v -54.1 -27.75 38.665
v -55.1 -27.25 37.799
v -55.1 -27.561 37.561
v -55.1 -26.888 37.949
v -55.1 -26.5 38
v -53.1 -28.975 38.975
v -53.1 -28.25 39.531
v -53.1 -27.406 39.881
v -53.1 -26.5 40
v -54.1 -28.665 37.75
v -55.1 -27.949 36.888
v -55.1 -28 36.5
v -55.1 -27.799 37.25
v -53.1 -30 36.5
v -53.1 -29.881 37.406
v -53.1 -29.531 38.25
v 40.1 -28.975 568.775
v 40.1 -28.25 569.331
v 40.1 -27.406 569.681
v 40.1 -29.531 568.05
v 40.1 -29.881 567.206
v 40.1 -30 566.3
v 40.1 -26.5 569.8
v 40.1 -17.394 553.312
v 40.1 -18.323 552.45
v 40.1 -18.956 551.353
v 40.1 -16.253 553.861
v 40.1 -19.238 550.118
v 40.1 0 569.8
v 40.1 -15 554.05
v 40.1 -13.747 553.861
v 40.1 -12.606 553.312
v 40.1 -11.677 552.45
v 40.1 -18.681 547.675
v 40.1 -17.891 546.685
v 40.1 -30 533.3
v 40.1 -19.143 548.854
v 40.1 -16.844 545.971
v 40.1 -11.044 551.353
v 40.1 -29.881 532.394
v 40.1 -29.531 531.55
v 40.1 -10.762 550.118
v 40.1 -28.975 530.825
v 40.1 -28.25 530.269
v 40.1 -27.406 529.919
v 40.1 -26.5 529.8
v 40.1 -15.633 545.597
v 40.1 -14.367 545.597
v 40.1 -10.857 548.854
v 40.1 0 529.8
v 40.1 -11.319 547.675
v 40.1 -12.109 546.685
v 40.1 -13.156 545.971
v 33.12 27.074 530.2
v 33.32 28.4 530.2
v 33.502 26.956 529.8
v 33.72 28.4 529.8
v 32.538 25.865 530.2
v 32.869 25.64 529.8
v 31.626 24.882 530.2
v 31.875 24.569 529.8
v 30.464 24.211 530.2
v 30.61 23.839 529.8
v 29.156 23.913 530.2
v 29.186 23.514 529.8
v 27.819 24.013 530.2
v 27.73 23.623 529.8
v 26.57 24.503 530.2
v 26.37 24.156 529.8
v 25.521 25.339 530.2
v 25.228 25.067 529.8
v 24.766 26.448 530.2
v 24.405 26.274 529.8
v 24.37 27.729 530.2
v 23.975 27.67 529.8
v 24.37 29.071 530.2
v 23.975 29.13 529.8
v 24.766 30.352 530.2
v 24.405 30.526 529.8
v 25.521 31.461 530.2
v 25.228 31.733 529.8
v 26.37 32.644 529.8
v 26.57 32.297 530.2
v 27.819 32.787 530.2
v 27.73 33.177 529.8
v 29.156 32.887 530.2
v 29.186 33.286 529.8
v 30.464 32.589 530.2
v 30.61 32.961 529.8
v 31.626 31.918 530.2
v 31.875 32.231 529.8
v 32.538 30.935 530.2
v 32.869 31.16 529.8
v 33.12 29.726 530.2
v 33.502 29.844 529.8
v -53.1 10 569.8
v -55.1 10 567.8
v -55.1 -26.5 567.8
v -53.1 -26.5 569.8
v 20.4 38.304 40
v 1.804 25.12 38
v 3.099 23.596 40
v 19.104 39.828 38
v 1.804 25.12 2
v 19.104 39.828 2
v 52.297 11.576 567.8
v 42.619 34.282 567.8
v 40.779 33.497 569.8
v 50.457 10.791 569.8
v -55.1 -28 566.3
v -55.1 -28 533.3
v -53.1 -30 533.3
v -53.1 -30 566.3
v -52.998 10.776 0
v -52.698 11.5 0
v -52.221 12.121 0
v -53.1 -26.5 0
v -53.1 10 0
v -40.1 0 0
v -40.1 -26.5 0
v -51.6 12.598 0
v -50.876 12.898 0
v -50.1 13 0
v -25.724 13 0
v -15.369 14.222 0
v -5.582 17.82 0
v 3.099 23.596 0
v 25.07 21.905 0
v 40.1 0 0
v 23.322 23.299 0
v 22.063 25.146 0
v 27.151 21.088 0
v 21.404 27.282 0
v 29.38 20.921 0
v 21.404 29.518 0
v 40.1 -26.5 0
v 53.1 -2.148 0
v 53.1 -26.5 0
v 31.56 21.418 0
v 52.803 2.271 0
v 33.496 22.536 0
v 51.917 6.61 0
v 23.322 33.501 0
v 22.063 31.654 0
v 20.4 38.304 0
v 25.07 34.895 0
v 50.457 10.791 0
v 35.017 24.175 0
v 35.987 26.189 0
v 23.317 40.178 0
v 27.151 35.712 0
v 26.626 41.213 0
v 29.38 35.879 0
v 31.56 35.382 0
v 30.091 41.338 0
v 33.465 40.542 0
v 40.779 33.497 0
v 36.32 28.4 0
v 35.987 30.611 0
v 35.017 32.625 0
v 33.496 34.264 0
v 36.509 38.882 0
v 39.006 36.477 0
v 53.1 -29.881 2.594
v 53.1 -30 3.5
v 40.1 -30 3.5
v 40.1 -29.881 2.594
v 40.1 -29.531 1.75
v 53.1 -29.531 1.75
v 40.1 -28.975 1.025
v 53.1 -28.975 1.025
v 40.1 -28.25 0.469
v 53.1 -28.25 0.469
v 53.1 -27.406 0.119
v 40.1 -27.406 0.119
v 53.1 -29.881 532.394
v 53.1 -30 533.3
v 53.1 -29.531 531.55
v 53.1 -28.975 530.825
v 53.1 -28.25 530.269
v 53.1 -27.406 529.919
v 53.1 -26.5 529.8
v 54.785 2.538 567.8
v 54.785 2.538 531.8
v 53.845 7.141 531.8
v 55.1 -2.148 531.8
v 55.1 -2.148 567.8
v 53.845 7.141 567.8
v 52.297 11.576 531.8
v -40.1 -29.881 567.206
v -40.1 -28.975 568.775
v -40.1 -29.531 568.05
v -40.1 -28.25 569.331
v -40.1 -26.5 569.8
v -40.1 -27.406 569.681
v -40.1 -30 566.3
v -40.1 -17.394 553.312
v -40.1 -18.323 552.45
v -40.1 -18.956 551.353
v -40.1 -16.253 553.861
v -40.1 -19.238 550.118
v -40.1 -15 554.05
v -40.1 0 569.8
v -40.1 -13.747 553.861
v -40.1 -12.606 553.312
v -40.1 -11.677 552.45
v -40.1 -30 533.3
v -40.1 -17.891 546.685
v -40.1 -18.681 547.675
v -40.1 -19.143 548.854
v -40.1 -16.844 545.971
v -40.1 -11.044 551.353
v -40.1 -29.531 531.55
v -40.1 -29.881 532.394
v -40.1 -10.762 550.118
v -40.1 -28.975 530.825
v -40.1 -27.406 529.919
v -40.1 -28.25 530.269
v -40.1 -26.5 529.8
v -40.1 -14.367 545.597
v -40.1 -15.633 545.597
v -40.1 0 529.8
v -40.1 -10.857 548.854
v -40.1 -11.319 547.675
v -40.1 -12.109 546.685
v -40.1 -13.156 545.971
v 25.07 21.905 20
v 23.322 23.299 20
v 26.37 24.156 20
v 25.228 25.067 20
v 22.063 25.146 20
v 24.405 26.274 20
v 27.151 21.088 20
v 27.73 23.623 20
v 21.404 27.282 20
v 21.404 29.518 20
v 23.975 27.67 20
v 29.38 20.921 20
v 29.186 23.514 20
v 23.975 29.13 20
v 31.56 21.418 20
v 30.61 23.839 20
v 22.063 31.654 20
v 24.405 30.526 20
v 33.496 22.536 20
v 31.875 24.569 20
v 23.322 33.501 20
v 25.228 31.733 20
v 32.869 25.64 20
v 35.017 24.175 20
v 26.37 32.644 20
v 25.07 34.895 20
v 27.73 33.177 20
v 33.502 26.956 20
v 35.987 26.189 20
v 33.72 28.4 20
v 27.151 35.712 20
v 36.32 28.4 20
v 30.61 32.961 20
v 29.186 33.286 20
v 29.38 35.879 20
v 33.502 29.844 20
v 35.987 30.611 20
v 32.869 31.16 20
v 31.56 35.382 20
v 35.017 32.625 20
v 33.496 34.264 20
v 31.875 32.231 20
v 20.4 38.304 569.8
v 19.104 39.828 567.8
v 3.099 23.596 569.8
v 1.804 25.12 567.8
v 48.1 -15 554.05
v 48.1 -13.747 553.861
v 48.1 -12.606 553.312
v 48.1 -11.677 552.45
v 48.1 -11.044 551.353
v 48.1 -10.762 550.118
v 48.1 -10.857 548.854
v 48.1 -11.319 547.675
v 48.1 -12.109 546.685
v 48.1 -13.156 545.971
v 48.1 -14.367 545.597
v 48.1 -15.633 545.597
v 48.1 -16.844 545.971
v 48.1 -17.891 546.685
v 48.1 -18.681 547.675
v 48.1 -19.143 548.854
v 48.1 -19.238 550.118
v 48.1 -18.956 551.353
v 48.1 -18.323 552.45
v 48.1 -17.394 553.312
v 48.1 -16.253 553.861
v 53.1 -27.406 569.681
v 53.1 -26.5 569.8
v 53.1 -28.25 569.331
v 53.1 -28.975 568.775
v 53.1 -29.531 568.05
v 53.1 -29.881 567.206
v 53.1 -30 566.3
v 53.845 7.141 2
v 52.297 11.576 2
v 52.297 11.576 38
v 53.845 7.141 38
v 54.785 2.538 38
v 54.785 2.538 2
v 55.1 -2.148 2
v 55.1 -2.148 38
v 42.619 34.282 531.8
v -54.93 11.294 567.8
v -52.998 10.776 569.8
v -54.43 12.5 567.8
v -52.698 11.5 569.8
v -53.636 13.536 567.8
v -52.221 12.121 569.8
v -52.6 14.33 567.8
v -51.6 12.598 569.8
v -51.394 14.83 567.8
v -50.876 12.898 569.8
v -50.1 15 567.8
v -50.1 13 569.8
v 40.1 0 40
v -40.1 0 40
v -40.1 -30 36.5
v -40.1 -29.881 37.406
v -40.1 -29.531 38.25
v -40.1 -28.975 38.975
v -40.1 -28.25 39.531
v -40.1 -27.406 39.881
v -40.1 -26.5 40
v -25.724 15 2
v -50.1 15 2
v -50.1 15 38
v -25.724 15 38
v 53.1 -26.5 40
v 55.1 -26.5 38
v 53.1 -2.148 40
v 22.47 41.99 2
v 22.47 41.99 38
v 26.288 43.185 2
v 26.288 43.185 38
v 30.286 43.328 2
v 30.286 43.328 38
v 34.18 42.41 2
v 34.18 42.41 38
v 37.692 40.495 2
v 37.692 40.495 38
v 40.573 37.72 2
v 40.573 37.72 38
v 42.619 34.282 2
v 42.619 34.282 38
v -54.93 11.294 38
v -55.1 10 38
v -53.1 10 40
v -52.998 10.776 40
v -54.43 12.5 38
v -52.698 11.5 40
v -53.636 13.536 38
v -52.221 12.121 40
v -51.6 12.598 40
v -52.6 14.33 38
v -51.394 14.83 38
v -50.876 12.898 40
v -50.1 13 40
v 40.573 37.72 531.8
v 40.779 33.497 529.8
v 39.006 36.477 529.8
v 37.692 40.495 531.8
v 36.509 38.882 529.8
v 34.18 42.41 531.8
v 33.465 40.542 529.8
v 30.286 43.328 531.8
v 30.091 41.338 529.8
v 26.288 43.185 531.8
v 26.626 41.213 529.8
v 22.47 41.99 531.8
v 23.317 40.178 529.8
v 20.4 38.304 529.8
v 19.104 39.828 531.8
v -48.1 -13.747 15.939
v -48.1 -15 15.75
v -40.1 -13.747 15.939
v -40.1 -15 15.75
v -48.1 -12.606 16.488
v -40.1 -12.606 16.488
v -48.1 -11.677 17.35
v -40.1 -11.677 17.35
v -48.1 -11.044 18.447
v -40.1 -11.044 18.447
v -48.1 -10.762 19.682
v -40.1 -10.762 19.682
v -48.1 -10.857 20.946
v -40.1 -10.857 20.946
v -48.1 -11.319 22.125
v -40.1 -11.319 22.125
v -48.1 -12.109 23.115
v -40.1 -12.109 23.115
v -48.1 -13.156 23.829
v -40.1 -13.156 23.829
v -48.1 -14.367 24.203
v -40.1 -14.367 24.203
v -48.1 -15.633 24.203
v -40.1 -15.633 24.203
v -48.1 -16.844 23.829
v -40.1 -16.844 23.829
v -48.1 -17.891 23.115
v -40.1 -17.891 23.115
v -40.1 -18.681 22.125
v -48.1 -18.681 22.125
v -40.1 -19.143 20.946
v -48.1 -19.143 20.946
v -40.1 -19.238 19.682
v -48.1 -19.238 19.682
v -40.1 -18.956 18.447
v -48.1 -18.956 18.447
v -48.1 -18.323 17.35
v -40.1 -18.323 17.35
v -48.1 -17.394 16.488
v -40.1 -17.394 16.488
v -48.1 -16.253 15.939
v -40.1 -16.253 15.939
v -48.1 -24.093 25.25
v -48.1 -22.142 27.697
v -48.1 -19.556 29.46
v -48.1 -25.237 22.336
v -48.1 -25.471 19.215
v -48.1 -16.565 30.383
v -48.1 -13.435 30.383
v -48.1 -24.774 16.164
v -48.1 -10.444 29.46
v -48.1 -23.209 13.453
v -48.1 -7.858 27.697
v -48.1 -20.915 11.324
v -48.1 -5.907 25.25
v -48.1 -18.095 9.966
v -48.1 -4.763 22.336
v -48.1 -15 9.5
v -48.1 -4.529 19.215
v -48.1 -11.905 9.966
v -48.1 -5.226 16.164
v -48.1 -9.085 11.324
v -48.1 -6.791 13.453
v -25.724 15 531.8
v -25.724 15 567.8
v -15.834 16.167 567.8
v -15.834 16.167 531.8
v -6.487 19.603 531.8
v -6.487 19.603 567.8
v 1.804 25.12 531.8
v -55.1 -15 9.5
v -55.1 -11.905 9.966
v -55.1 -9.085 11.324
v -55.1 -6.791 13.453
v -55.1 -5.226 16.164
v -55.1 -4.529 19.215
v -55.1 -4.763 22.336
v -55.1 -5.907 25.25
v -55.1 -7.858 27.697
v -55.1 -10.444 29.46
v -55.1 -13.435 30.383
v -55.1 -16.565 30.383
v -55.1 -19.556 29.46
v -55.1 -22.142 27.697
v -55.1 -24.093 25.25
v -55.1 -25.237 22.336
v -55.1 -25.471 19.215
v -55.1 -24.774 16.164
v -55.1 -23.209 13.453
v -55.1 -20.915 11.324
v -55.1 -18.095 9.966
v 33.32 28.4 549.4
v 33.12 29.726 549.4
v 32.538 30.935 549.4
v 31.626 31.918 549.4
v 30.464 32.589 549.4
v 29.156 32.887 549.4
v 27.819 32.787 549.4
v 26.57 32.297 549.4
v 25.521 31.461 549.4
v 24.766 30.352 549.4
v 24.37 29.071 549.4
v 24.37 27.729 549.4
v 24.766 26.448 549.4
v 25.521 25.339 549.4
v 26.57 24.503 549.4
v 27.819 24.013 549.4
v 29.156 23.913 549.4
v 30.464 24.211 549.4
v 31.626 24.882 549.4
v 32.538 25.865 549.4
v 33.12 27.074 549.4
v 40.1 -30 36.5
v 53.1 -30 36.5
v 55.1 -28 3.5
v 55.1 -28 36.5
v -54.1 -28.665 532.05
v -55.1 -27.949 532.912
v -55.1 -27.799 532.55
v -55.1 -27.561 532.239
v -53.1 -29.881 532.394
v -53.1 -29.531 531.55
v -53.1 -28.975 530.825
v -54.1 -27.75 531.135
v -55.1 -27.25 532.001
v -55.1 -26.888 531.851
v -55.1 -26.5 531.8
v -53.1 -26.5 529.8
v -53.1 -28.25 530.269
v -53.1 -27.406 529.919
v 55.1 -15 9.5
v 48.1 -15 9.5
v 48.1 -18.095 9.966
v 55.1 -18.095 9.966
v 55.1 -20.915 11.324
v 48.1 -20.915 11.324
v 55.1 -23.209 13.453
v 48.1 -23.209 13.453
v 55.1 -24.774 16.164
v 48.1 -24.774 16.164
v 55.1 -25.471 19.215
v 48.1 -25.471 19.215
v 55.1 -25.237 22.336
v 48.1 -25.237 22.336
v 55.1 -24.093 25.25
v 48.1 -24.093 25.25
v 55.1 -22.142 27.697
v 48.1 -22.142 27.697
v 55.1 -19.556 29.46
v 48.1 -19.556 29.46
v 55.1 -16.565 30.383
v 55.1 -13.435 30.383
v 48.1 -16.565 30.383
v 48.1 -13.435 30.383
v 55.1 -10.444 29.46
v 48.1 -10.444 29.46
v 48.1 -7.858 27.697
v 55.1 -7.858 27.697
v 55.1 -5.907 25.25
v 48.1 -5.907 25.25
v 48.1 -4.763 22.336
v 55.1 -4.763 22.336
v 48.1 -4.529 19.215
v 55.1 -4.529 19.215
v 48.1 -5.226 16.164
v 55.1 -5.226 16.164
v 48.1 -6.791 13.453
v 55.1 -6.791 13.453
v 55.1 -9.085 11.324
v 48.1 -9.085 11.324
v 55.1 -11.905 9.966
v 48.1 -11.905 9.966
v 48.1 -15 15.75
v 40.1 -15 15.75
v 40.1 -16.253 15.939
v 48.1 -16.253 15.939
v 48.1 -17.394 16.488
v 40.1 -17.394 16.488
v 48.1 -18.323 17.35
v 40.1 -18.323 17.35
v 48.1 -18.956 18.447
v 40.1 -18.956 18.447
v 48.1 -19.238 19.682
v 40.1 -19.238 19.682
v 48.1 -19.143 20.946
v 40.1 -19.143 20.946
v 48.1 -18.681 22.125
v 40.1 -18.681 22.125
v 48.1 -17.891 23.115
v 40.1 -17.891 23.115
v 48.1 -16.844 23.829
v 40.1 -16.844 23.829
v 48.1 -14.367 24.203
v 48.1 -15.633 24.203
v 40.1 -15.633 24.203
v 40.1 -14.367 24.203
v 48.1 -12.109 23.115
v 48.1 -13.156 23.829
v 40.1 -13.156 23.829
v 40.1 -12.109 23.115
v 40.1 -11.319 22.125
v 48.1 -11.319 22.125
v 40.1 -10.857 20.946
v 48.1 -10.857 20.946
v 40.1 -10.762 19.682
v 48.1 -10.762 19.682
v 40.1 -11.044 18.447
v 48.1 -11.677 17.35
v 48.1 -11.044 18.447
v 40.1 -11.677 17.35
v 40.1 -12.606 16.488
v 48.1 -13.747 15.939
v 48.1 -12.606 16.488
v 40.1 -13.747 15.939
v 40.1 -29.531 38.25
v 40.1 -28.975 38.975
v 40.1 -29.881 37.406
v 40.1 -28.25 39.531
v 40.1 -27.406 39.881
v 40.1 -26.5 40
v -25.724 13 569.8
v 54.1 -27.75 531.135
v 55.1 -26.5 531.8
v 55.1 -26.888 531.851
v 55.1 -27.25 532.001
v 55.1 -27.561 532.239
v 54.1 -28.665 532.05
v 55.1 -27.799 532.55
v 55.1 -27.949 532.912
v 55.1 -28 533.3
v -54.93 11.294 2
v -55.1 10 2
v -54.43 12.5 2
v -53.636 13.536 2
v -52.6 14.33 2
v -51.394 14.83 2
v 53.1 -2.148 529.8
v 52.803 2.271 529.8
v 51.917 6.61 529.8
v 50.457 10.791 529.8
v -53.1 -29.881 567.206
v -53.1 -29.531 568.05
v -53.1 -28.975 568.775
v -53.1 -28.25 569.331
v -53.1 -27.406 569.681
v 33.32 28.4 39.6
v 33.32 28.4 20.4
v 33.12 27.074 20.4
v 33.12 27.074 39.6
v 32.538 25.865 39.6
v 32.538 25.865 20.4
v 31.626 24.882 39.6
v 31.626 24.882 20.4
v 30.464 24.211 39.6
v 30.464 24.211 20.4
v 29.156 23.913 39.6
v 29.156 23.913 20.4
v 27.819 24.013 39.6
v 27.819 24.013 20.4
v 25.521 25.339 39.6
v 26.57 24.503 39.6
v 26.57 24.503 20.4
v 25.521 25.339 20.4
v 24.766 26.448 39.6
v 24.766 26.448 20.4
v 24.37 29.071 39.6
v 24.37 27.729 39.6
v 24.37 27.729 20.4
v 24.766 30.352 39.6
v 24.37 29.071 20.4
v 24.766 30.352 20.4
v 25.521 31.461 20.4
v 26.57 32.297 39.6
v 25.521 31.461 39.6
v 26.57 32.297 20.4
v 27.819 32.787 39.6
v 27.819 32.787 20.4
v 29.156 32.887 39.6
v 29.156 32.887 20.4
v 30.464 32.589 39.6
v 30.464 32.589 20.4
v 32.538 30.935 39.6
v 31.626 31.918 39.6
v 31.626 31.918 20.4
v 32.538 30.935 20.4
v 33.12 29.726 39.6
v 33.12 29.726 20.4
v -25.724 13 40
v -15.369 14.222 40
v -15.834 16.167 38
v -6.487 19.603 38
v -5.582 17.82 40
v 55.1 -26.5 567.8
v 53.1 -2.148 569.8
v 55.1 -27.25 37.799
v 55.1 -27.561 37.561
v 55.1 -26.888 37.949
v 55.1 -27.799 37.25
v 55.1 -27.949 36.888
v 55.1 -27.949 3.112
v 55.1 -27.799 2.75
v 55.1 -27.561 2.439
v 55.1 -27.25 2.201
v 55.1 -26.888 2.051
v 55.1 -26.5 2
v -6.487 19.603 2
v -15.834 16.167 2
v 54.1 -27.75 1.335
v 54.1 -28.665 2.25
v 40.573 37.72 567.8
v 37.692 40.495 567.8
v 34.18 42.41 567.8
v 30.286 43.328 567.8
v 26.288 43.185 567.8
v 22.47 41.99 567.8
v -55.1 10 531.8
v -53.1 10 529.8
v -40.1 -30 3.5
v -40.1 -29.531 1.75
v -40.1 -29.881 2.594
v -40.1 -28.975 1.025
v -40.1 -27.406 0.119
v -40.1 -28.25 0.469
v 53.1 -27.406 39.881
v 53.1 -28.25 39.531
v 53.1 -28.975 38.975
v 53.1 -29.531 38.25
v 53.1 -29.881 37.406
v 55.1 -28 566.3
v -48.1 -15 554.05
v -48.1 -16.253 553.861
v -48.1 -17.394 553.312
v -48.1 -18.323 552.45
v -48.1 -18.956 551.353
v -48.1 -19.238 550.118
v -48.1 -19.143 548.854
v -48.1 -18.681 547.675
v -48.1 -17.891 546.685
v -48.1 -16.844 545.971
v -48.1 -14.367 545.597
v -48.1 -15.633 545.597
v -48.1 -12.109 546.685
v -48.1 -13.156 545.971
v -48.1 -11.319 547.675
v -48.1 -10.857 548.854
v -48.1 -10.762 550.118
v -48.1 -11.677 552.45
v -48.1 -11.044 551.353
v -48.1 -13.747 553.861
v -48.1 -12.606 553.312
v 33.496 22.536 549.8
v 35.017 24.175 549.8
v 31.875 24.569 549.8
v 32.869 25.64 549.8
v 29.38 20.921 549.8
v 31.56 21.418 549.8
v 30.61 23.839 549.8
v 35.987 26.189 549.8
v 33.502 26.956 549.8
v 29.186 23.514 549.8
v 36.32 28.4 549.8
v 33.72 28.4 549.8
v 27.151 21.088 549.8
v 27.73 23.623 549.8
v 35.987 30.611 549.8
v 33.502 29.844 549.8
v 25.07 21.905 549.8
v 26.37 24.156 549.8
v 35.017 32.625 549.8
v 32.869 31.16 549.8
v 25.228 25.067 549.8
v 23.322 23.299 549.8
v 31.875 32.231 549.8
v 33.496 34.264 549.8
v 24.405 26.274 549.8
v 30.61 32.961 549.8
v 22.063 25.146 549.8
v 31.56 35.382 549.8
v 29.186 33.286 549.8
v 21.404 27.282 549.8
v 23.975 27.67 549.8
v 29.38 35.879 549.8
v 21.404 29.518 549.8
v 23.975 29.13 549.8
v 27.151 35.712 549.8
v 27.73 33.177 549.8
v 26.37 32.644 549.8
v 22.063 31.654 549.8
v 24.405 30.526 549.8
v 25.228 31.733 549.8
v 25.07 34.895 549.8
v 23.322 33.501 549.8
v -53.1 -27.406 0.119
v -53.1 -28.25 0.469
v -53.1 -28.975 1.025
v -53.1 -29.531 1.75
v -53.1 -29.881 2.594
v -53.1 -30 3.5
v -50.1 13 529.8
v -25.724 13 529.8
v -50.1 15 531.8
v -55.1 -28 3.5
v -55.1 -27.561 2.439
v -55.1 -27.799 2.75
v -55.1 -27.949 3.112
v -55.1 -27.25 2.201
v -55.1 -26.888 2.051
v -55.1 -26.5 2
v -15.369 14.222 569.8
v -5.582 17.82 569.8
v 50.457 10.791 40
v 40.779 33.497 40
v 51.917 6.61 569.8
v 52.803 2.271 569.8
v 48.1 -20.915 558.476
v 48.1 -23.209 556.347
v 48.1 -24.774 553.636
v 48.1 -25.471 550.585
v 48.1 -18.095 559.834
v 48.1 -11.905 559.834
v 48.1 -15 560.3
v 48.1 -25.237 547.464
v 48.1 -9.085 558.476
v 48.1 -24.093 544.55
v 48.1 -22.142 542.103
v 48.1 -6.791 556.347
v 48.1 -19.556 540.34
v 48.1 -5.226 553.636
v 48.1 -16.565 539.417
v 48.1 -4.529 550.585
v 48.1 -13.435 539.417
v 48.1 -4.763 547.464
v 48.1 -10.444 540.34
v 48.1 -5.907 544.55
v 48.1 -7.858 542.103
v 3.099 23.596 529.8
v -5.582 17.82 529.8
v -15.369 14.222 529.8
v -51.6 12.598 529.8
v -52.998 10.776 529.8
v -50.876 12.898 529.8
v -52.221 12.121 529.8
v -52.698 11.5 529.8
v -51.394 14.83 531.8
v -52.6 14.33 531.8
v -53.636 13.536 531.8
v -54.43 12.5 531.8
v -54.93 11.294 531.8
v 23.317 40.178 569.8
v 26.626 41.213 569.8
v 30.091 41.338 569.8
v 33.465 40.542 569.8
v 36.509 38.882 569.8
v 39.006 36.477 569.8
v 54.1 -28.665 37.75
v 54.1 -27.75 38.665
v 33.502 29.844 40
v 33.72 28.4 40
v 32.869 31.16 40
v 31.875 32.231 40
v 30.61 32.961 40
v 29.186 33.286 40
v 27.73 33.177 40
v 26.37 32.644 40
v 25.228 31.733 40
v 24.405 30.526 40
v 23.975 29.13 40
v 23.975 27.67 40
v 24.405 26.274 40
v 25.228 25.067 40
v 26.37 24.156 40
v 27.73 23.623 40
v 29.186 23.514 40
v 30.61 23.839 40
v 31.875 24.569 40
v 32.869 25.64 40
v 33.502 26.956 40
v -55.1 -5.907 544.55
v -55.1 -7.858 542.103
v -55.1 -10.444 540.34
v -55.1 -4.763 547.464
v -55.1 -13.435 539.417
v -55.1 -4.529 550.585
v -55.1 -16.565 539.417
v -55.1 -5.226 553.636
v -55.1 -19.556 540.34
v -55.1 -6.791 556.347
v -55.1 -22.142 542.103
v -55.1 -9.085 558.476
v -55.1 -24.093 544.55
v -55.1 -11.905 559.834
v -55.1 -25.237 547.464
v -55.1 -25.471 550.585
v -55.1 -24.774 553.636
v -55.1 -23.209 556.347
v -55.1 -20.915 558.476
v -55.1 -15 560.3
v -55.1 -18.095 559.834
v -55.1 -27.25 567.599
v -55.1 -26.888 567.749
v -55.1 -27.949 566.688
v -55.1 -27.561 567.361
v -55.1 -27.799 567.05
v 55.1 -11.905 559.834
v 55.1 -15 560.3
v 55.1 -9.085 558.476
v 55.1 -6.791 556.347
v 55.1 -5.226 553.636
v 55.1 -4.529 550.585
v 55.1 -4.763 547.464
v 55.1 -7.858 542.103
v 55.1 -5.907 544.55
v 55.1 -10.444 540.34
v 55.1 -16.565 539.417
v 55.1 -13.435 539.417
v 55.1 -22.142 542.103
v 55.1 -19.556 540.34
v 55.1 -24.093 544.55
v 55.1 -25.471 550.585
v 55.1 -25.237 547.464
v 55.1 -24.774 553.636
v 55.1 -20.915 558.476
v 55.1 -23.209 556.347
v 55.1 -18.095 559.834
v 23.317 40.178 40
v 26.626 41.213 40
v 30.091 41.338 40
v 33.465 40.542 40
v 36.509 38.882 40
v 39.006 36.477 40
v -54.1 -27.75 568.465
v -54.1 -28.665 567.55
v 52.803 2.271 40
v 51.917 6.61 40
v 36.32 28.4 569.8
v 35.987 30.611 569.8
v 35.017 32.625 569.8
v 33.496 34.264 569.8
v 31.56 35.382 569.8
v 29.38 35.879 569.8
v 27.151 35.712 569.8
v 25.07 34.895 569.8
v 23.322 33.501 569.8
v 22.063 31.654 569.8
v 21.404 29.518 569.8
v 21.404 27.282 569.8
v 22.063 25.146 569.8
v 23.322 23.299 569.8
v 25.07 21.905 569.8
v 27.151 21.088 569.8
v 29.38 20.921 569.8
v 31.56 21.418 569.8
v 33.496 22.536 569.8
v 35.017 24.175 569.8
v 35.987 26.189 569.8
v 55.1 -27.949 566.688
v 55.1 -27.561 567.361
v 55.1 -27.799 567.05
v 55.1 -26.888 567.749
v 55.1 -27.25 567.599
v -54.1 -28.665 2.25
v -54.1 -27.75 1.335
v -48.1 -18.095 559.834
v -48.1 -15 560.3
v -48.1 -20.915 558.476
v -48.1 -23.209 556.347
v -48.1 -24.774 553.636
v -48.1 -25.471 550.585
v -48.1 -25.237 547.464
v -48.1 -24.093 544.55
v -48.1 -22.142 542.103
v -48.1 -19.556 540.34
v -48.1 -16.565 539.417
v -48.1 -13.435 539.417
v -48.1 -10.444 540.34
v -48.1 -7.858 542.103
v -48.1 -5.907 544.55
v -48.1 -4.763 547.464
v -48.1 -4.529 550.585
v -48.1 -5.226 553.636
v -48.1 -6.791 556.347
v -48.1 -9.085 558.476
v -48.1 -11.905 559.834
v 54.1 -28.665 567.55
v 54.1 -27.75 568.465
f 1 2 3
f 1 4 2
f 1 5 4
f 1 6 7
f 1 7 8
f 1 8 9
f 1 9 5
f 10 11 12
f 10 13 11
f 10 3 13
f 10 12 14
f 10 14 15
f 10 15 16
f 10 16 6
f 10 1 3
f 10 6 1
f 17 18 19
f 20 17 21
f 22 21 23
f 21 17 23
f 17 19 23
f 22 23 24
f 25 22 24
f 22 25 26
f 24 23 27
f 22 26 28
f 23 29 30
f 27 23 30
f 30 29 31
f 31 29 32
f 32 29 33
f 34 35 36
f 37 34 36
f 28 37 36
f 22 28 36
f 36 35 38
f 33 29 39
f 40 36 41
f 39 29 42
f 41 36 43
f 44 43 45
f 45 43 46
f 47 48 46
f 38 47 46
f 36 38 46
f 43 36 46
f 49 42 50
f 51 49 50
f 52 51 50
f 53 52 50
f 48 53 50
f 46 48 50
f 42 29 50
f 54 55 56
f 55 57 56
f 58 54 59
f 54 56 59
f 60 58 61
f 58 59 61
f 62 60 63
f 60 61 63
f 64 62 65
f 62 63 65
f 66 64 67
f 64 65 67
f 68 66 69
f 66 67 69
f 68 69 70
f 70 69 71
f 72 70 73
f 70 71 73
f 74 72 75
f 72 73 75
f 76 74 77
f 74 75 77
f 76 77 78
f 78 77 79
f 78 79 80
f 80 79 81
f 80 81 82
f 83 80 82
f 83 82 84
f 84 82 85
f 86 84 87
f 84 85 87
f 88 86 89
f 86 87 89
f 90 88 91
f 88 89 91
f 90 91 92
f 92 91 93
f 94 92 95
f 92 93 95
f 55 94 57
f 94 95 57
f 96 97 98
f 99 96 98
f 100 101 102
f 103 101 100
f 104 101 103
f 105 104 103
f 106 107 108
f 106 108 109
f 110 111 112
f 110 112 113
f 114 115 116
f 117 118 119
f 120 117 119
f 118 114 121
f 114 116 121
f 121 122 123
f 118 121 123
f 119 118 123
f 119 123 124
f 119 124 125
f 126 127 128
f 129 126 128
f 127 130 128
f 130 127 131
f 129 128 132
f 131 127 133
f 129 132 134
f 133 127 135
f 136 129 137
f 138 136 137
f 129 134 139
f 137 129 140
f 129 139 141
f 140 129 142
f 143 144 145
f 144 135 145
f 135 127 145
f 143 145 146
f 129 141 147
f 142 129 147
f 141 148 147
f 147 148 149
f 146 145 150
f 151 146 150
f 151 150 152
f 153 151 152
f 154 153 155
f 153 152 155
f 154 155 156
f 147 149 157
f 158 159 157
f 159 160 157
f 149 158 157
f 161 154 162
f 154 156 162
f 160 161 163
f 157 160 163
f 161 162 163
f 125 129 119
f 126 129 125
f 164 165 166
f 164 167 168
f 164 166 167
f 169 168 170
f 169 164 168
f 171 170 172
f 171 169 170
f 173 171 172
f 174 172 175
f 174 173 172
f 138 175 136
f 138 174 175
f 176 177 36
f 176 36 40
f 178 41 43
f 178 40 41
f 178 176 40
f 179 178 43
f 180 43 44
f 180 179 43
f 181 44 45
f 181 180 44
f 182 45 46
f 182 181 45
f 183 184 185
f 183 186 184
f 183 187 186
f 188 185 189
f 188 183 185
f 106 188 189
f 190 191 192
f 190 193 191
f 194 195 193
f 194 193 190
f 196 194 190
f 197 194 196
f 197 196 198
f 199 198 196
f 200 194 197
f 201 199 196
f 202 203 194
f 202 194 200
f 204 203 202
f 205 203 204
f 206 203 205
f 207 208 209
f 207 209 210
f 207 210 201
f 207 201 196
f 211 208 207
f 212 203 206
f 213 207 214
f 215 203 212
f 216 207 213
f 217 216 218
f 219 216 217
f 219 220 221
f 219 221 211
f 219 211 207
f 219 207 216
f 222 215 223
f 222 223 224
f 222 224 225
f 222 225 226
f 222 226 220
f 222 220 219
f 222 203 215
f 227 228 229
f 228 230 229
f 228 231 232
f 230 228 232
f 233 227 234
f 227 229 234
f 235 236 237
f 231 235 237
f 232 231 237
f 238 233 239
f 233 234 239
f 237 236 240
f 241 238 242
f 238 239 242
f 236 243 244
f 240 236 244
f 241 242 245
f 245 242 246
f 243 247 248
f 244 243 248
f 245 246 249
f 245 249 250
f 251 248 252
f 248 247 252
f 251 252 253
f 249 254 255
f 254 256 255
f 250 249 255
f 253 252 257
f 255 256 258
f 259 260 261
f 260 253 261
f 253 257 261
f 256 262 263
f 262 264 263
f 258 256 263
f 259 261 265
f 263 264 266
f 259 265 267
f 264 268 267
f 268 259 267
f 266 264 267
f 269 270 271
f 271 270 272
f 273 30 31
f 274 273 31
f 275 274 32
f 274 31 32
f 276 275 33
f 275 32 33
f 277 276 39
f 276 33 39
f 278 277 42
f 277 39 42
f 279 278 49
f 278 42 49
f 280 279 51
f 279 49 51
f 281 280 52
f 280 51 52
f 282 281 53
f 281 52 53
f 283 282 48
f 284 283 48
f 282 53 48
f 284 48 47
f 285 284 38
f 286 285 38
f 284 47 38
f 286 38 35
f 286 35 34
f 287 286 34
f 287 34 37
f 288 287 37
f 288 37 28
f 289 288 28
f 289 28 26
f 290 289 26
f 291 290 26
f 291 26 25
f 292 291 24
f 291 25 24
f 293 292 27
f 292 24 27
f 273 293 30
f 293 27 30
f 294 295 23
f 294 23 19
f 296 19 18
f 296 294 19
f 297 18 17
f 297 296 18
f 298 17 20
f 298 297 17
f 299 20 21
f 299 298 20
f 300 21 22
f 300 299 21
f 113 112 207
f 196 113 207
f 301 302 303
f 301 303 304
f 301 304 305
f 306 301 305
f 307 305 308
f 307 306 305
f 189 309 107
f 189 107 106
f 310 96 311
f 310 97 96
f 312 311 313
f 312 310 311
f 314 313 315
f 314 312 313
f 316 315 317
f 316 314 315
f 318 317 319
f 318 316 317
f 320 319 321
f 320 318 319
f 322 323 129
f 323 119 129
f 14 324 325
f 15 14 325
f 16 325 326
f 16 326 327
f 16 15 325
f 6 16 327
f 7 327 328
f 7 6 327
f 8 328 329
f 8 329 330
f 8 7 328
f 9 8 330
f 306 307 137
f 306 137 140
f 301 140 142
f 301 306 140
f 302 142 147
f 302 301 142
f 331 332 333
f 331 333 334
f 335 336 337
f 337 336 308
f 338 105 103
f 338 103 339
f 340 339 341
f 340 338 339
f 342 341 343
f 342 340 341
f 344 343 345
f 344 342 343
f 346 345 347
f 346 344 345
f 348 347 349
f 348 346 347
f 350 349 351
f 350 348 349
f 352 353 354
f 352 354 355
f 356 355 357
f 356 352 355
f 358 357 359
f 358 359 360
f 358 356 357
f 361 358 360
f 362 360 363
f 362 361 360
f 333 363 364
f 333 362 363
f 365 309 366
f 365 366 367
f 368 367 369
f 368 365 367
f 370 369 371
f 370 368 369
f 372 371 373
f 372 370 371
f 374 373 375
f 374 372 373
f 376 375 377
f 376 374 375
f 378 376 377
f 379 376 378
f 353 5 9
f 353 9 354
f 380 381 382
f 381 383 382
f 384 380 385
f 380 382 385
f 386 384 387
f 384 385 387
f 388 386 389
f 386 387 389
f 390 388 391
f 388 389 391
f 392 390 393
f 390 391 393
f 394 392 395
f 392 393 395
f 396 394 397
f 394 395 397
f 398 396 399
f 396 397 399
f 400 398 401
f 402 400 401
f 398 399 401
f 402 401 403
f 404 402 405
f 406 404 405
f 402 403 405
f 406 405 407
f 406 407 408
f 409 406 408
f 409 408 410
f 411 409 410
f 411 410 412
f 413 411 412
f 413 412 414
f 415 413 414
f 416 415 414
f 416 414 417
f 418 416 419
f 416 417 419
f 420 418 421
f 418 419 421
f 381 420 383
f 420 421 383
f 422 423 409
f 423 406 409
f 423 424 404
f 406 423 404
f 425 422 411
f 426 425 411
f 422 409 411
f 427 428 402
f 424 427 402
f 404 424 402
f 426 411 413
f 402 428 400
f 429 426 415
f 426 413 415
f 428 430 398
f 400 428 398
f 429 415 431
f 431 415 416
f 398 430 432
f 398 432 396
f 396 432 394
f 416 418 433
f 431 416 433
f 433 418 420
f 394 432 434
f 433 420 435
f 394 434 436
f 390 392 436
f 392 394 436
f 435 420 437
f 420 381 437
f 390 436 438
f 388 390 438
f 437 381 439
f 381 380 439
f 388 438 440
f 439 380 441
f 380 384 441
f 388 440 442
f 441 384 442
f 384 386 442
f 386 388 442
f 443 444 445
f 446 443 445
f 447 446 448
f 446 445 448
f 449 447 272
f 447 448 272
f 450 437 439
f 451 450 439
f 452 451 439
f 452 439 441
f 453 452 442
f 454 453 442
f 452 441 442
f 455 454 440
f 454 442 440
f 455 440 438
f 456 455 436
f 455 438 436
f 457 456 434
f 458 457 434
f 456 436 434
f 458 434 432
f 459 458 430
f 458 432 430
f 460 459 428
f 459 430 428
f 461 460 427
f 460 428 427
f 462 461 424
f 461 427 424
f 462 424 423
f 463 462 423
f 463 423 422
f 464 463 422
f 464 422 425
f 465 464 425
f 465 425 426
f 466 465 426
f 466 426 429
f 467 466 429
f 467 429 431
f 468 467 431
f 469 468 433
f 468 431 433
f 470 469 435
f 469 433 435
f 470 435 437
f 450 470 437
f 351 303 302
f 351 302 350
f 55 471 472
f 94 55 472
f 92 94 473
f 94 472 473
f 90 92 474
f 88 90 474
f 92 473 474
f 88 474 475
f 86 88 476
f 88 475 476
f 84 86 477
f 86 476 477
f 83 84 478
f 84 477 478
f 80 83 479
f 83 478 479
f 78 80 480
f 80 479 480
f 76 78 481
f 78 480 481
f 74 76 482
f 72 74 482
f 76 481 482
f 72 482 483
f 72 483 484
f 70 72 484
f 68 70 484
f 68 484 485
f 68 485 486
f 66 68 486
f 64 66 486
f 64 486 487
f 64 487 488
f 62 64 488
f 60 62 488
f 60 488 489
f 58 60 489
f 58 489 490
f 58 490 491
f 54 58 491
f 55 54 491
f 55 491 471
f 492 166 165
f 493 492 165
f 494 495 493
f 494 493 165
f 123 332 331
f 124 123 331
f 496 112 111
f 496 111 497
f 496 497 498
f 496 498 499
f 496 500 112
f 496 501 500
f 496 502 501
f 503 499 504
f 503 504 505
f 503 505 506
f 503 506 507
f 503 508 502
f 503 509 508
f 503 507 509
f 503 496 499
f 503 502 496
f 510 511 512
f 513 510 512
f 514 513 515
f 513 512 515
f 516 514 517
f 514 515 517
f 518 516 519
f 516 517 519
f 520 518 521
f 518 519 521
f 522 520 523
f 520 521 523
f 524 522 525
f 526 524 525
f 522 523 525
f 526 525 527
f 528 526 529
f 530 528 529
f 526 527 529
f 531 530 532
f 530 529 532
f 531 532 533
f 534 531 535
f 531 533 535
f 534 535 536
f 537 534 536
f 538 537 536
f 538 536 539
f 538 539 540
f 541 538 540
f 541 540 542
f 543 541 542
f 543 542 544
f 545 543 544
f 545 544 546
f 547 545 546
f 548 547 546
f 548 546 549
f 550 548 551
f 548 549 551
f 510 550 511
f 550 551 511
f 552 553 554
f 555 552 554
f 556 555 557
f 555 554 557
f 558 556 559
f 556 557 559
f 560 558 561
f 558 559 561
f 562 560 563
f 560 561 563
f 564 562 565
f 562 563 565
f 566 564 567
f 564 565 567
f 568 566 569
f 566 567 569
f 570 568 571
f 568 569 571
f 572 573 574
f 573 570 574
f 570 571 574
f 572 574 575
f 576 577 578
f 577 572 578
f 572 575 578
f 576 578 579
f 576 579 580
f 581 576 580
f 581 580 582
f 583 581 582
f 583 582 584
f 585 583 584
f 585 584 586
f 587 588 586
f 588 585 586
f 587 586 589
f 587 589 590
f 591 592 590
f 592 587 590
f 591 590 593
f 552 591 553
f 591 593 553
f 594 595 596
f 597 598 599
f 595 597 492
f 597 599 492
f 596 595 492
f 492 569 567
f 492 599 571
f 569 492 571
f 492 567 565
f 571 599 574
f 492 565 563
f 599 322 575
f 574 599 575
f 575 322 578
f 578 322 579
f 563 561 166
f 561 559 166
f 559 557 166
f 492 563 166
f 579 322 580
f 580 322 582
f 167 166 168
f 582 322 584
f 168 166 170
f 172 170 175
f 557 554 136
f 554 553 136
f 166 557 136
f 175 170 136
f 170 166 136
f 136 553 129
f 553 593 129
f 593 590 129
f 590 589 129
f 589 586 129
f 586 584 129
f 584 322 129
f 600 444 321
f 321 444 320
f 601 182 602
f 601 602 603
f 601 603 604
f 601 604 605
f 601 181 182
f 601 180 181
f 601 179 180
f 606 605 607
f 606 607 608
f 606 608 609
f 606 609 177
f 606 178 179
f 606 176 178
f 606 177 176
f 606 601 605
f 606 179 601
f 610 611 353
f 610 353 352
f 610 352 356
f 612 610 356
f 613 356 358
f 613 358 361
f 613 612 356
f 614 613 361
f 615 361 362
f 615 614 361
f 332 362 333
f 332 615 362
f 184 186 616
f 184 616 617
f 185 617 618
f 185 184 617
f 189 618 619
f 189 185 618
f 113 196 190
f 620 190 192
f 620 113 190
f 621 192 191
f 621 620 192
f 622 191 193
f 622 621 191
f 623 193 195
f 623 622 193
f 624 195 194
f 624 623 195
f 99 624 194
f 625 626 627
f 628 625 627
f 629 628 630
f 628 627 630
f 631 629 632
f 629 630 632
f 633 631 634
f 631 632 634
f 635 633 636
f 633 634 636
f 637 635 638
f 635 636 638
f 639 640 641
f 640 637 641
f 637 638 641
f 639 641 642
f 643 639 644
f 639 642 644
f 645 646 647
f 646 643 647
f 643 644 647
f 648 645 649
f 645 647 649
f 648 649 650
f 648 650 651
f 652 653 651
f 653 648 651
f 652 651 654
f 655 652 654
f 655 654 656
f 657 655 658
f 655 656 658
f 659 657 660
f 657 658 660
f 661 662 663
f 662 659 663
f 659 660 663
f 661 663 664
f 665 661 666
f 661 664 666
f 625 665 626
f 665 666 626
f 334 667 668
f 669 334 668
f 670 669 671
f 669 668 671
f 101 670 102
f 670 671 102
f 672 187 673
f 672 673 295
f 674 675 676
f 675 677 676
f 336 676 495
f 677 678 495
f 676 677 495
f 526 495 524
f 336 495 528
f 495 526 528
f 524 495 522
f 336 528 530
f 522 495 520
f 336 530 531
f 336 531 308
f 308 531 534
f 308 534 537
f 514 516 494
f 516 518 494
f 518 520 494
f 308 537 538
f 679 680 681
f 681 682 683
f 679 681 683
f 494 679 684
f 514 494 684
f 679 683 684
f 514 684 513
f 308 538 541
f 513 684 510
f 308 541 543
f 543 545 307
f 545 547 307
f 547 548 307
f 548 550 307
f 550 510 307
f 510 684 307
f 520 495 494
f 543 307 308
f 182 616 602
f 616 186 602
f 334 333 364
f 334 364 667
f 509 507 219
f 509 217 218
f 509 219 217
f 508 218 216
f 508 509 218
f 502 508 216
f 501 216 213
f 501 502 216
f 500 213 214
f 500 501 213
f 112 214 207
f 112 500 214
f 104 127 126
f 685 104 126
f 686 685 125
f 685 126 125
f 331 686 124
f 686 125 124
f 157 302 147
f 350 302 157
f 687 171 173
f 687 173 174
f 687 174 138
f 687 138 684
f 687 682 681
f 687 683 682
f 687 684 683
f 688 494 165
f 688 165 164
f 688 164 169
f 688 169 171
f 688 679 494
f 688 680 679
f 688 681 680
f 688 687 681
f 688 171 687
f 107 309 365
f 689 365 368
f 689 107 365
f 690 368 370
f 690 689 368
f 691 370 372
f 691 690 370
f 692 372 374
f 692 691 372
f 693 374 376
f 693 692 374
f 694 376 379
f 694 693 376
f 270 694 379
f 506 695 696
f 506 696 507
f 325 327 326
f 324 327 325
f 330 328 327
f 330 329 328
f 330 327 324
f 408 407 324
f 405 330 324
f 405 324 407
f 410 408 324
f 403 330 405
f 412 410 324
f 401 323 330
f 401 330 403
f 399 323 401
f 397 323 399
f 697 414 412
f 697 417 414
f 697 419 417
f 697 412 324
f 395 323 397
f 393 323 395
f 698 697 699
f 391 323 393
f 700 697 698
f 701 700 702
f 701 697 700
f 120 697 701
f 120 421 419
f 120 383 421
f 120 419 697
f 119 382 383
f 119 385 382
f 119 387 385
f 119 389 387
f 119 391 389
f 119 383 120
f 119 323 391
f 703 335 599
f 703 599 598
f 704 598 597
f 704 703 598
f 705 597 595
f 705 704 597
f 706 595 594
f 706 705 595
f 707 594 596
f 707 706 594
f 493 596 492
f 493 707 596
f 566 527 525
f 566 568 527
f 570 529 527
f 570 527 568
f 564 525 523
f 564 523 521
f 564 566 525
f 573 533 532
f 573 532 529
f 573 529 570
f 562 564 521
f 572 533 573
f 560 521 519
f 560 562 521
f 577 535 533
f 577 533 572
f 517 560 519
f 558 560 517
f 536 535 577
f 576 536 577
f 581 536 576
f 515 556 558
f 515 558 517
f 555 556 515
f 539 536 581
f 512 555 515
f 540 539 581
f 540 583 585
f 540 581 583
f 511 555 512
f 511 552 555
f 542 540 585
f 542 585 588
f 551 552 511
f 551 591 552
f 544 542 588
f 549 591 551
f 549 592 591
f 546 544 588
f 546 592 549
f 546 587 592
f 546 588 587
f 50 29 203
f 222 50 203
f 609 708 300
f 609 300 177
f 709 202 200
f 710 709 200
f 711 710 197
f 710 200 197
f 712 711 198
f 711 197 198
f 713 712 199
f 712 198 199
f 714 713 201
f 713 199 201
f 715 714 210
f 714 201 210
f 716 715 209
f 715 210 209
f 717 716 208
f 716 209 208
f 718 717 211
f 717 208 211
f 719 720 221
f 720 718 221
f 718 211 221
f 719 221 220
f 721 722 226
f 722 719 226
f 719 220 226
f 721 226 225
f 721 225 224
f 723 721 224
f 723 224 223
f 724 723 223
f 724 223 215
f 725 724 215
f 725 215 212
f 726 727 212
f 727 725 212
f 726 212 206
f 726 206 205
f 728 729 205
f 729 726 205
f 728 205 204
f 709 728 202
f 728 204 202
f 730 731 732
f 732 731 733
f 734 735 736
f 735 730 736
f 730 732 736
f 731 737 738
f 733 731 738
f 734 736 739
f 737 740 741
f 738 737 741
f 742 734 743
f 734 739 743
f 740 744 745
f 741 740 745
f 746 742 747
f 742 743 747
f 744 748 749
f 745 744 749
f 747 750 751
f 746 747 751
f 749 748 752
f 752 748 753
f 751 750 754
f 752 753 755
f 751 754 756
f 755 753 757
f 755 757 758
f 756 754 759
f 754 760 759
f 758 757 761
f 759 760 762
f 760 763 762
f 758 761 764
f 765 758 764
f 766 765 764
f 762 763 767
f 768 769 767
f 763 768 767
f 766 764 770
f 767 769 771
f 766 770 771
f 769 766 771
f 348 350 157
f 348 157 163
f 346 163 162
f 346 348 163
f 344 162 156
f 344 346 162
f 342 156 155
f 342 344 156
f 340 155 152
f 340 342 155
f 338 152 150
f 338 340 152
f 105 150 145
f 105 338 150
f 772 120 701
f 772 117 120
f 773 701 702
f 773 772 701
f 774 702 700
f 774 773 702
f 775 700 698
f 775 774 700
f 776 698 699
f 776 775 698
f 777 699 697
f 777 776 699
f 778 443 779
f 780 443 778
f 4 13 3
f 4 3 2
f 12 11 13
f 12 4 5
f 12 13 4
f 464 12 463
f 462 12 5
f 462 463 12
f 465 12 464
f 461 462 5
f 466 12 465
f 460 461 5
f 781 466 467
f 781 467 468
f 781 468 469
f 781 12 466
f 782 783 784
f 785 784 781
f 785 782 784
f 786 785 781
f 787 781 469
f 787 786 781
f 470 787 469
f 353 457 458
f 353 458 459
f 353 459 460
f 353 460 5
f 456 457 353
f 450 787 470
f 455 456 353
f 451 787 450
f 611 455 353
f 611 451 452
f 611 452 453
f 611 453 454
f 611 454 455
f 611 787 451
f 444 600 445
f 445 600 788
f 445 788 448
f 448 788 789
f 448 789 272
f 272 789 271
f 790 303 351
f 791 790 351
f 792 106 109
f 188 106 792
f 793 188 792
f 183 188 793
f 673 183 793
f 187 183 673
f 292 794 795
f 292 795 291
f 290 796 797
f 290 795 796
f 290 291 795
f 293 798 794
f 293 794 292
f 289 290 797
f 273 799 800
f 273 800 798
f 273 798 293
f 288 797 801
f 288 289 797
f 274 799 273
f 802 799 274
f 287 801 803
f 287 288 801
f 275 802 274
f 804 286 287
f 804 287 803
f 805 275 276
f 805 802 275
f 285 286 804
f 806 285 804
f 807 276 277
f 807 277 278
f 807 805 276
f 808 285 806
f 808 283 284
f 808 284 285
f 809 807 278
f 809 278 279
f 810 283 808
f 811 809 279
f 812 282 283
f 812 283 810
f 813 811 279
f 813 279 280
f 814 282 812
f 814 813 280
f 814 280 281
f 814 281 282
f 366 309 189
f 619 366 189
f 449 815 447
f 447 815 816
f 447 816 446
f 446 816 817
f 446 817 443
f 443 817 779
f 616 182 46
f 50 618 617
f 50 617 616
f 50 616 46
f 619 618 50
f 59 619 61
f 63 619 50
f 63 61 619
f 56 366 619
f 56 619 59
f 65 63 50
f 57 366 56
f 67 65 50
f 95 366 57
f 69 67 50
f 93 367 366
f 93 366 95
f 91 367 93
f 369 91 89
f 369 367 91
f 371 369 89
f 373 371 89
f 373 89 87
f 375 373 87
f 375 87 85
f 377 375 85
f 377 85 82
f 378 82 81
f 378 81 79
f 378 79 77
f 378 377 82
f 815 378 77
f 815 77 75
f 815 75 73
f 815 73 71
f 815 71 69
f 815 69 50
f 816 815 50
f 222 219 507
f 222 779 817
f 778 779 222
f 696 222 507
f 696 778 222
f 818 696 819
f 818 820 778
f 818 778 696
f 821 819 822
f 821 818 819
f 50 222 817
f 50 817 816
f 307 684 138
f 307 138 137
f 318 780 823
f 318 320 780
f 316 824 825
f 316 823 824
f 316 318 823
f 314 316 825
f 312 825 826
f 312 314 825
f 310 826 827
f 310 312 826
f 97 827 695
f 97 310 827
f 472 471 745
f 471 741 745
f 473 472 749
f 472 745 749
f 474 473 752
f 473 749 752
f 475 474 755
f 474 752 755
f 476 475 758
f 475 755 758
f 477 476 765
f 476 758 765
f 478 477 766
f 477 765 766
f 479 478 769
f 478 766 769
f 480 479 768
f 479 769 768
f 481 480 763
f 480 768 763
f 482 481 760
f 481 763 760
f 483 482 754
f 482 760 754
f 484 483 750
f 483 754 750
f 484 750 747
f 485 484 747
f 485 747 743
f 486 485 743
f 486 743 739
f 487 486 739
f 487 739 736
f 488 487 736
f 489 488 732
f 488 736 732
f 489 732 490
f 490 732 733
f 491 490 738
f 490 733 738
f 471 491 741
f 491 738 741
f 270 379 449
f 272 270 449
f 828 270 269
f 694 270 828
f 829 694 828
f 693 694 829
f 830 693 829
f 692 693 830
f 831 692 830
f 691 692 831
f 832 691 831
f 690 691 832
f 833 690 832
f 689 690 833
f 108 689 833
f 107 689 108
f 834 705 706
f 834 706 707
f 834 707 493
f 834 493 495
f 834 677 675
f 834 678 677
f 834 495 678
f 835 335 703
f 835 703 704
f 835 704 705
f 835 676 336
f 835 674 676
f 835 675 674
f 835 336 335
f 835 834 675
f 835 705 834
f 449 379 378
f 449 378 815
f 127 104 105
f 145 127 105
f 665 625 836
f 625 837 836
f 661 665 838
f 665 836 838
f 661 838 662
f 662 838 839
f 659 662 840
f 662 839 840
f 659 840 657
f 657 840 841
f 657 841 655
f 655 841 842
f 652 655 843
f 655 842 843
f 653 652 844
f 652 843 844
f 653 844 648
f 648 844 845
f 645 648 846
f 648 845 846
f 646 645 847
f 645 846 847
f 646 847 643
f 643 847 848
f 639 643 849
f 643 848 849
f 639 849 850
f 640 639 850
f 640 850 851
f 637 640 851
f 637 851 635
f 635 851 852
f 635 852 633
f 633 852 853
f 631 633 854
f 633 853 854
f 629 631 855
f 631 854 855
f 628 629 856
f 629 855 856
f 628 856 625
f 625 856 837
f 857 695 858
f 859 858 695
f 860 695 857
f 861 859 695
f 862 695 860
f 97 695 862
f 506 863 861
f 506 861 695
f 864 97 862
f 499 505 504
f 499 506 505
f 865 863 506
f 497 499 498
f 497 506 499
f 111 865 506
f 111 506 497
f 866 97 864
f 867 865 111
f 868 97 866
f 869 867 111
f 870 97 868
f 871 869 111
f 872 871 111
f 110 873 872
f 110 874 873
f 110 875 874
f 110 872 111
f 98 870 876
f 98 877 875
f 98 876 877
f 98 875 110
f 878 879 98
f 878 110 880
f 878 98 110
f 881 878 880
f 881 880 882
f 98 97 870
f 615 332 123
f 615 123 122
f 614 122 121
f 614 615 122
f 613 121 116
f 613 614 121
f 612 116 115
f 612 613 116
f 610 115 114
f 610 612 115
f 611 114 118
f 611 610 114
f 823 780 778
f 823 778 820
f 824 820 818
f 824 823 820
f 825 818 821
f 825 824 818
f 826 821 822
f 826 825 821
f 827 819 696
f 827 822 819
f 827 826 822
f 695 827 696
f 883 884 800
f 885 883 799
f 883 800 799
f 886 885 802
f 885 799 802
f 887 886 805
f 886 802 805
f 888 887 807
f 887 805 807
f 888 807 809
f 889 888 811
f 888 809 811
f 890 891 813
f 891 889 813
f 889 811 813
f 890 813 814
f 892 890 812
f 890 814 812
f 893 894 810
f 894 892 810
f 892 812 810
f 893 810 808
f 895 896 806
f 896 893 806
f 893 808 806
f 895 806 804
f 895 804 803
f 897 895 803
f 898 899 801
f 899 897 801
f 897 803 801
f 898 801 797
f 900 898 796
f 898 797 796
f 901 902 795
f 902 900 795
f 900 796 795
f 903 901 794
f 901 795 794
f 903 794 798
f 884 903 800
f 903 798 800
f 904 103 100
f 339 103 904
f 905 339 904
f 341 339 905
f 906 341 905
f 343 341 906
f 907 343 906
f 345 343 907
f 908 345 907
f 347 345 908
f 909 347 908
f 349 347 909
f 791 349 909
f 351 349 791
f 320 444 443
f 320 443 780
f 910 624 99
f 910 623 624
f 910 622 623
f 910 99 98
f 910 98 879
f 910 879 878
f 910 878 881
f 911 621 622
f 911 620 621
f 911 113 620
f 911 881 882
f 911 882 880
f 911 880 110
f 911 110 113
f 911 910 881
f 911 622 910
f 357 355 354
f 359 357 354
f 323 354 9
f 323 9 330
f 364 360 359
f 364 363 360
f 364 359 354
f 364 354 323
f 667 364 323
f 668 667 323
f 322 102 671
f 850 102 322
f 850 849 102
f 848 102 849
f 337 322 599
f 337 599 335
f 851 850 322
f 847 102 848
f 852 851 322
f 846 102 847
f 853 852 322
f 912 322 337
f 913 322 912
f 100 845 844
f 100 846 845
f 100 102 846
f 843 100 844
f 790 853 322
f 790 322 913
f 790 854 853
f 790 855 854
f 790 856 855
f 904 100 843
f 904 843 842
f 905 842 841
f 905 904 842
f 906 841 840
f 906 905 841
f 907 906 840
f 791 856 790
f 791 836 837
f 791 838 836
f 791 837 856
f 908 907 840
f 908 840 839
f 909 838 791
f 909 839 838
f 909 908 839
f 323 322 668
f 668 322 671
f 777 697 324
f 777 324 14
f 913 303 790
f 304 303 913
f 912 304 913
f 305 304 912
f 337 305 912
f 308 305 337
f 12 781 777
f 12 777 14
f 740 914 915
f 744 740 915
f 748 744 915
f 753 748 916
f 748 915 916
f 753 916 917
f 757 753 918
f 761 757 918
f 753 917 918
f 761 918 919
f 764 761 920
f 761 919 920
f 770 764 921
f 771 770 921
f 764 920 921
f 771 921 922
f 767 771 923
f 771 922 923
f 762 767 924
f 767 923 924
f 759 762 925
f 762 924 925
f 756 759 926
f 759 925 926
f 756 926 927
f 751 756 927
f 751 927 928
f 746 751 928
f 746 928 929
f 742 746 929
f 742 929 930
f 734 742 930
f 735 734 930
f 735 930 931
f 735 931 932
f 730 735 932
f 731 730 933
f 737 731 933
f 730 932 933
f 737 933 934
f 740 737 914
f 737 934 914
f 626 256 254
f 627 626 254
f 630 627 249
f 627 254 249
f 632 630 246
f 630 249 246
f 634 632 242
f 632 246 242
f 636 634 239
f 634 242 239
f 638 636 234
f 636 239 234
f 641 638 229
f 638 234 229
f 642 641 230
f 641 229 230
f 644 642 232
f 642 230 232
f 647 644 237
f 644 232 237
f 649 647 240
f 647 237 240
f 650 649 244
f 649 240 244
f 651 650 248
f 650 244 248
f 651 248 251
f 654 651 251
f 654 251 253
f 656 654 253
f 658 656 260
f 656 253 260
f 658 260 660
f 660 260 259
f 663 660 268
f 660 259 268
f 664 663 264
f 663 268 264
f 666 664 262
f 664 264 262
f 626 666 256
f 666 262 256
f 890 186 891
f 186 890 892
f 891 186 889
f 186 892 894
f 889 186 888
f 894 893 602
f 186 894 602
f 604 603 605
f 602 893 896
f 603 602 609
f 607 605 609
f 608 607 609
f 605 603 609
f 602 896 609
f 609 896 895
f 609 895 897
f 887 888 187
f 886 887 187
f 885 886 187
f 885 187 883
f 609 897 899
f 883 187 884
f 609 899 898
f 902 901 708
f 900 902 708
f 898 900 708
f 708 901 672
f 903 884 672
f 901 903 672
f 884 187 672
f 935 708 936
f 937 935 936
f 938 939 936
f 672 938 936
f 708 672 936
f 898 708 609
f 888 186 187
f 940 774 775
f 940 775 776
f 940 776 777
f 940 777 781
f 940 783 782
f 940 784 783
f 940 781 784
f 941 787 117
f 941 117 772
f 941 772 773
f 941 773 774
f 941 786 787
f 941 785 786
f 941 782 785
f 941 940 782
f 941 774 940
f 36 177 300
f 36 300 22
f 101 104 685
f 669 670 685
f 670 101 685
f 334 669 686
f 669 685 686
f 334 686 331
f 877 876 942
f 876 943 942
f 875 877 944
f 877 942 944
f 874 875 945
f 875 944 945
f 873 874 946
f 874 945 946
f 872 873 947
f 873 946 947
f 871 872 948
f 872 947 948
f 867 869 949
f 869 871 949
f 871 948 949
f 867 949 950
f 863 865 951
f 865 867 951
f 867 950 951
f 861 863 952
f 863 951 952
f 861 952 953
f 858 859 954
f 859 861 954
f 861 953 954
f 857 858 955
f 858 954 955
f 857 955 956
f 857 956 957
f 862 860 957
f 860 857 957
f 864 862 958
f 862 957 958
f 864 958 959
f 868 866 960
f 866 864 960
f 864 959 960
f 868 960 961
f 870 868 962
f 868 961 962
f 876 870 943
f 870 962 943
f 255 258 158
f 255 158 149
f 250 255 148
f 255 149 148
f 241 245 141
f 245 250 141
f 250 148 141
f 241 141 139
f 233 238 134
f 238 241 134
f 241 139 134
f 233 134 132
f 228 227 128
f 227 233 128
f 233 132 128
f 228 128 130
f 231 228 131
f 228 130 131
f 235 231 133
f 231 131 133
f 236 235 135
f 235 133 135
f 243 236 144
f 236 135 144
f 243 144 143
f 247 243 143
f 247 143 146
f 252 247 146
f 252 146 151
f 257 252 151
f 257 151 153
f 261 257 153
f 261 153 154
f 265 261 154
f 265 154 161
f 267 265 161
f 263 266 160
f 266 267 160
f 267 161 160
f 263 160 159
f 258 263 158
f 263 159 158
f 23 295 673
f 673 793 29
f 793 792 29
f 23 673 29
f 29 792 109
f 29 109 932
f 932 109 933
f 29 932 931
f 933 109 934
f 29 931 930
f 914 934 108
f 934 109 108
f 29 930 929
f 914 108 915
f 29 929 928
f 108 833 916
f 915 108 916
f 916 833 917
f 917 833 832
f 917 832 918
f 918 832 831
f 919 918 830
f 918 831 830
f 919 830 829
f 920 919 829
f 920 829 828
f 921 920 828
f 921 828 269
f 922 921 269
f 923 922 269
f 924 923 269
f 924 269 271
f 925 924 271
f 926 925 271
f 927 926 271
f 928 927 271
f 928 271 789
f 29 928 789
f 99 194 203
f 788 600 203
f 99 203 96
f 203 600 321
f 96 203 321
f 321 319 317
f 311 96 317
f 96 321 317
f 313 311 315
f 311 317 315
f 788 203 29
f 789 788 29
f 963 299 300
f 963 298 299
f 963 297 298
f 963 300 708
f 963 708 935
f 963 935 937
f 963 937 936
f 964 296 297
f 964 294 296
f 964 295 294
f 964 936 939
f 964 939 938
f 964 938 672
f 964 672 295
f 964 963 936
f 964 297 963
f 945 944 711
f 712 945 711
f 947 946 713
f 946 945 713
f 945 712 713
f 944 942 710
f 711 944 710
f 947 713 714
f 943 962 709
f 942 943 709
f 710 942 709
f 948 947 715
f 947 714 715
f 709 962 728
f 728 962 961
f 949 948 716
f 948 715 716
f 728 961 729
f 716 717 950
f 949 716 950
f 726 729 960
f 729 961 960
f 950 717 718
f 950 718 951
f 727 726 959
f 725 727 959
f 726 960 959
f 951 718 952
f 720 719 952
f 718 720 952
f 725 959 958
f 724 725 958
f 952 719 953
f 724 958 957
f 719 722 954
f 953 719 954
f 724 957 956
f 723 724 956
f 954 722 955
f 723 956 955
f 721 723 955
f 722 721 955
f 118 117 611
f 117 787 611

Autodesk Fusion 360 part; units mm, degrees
sketch "Sketch1" plane through (0, 0, 0) normal (0, 0, 1) x (1, 0, 0)
  line L0 (-40.1, 0) -> (40.1, 0)
  line L1 (40.1, 0) -> (40.1, -30)
  line L2 (40.1, -30) -> (55.1, -30)
  line L3 (55.1, -30) -> (55.1, -2.1482)
  line L4 (52.2971, 11.5757) -> (42.6188, 34.2817)
  circle A0 centre (28.82, 28.4) radius 15
  circle A1 centre (28.82, 28.4) radius 4.5
  line L5 (-40.1, 0) -> (-40.1, -30)
  line L6 (-40.1, -30) -> (-55.1, -30)
  line L7 (-55.1, -30) -> (-55.1, 10)
  line L8 (-50.1, 15) -> (-25.7242, 15)
  line L9 (1.8038, 25.1201) -> (19.1042, 39.8282)
  arc A2 (-25.7242, 15) -> (1.8038, 25.1201) centre (-25.7242, 57.5) ccw
  arc A3 (-50.1, 15) -> (-55.1, 10) centre (-50.1, 10) ccw
  arc A4 (55.1, -2.1482) -> (52.2971, 11.5757) centre (20.1, -2.1482) ccw
  circle A5 centre (28.82, 28.4) radius 7.5
  point P0 (55.1, 5)
  point P1 (-55.1, 15)
  point P2 (-10.1, 15)
  dimension "d1" = 80.2
  dimension "d2" = 15
  dimension "d3" = 11.28
  dimension "d4" = 28.4
  dimension "d5" = 30
  dimension "d6" = 9
  dimension "d7" = 5
  dimension "d8" = 30
  dimension "d9" = 15
  dimension "d10" = 15
  dimension "d13" = 45
  dimension "d14" = 42.5
  dimension "d15" = 5
  dimension "d16" = 35
  dimension "d19" = 15
extrude "Extrude1" add sketch "Sketch1" along normal blind 40 contours L0 L1 L2 L3 L4 A0 L5 L6 L7 L8 L9 A2 A3 A4 | A0 | A5 makes body 1
extrude "Extrude2" cut sketch "Sketch1" along normal blind 20 contours A5 bodies 1
fillet "Fillet1" radius 3.5 4 edges at (47.6, -30, 40) (47.6, -30, 0) (-47.6, -30, 0) (-47.6, -30, 40) on bodies 1
chamfer "Chamfer1" distance 2 angle 45 18 edges at (-11.0596, 17.6102, 40) (-37.9121, 15, 40) (-53.6355, 13.5355, 40) (-55.1, -10, 40) (55.1, -16.0741, 40) (54.3921, 4.8554, 40) (47.4579, 22.9287, 40) (32.2636, 42.9994, 40) (10.454, 32.4741, 40) (47.4579, 22.9287, 0) (32.2636, 42.9994, 0) (10.454, 32.4741, 0) (-11.0596, 17.6102, 0) (-37.9121, 15, 0) (-53.6355, 13.5355, 0) (-55.1, -10, 0) (55.1, -16.0741, 0) (54.3921, 4.8554, 0) on bodies 1
chamfer "Chamfer1" distance 0.4 angle 45 1 faces at (33.2976, 27.9519, 26.6667) on bodies 1
sketch "Sketch2" plane through (-40.1, 0, 0) normal (1, 0, 0) x (0, 0, -1)
  line L0 (0, -26.5) -> (0, 0)
  line L1 (0, 0) -> (-40, 0)
  line L2 (-40, 0) -> (-40, -26.5)
  line L3 (-36.5, -30) -> (-3.5, -30)
  circle A0 centre (-20, -15) radius 10.5
  circle A1 centre (-20, -15) radius 4.25
  arc A2 (-40, -26.5) -> (-36.5, -30) centre (-36.5, -26.5) ccw
  arc A3 (-3.5, -30) -> (0, -26.5) centre (-3.5, -26.5) ccw
  line L4 (0, -26.5) -> (0, -30) construction
  line L5 (0, -30) -> (-3.5, -30) construction
  line L6 (0, -30) -> (-40, 0) construction
  dimension "d22" = 21
  dimension "d23" = 8.5
extrude "Extrude3" cut sketch "Sketch2" along normal mid plane 280 contours A0 | A1 bodies 1
extrude "Extrude4" add sketch "Sketch2" against normal blind 8 contours A0 bodies 1
extrude "Extrude5" add sketch "Sketch2" along normal blind 8 from surface at 80.2 contours A0 bodies 1
ref_plane "WorkPlane1" through (0, 7.3702, 284.9) normal (0, 0, 1) x (1, 0, 0)
mirror "Mirror1" about plane through (0, 7.3702, 284.9) normal (0, 0, 1) of bodies 1 makes body 2
copy_body "Body->Comp1" bodies 1 removing the originals makes body 3 in component "wheelstand base cover RH"
copy_body "Body->Comp2" bodies 2 removing the originals makes body 4 in component "wheelstand base cover LH"
component "wheelstand base cover RH" placed x (1, 0, 0) y (0, 1, 0) z (0, 0, 1) at (0, 0, 0)
component "wheelstand base cover LH" placed x (1, 0, 0) y (0, 1, 0) z (0, 0, 1) at (0, 0, 0)
equation "d3 = 20 mm - 8.72 mm"
equation "d4 = 30 mm - 1.6 mm"
equation "d33 = ( 489.8 / 2 ) * 1 mm"
